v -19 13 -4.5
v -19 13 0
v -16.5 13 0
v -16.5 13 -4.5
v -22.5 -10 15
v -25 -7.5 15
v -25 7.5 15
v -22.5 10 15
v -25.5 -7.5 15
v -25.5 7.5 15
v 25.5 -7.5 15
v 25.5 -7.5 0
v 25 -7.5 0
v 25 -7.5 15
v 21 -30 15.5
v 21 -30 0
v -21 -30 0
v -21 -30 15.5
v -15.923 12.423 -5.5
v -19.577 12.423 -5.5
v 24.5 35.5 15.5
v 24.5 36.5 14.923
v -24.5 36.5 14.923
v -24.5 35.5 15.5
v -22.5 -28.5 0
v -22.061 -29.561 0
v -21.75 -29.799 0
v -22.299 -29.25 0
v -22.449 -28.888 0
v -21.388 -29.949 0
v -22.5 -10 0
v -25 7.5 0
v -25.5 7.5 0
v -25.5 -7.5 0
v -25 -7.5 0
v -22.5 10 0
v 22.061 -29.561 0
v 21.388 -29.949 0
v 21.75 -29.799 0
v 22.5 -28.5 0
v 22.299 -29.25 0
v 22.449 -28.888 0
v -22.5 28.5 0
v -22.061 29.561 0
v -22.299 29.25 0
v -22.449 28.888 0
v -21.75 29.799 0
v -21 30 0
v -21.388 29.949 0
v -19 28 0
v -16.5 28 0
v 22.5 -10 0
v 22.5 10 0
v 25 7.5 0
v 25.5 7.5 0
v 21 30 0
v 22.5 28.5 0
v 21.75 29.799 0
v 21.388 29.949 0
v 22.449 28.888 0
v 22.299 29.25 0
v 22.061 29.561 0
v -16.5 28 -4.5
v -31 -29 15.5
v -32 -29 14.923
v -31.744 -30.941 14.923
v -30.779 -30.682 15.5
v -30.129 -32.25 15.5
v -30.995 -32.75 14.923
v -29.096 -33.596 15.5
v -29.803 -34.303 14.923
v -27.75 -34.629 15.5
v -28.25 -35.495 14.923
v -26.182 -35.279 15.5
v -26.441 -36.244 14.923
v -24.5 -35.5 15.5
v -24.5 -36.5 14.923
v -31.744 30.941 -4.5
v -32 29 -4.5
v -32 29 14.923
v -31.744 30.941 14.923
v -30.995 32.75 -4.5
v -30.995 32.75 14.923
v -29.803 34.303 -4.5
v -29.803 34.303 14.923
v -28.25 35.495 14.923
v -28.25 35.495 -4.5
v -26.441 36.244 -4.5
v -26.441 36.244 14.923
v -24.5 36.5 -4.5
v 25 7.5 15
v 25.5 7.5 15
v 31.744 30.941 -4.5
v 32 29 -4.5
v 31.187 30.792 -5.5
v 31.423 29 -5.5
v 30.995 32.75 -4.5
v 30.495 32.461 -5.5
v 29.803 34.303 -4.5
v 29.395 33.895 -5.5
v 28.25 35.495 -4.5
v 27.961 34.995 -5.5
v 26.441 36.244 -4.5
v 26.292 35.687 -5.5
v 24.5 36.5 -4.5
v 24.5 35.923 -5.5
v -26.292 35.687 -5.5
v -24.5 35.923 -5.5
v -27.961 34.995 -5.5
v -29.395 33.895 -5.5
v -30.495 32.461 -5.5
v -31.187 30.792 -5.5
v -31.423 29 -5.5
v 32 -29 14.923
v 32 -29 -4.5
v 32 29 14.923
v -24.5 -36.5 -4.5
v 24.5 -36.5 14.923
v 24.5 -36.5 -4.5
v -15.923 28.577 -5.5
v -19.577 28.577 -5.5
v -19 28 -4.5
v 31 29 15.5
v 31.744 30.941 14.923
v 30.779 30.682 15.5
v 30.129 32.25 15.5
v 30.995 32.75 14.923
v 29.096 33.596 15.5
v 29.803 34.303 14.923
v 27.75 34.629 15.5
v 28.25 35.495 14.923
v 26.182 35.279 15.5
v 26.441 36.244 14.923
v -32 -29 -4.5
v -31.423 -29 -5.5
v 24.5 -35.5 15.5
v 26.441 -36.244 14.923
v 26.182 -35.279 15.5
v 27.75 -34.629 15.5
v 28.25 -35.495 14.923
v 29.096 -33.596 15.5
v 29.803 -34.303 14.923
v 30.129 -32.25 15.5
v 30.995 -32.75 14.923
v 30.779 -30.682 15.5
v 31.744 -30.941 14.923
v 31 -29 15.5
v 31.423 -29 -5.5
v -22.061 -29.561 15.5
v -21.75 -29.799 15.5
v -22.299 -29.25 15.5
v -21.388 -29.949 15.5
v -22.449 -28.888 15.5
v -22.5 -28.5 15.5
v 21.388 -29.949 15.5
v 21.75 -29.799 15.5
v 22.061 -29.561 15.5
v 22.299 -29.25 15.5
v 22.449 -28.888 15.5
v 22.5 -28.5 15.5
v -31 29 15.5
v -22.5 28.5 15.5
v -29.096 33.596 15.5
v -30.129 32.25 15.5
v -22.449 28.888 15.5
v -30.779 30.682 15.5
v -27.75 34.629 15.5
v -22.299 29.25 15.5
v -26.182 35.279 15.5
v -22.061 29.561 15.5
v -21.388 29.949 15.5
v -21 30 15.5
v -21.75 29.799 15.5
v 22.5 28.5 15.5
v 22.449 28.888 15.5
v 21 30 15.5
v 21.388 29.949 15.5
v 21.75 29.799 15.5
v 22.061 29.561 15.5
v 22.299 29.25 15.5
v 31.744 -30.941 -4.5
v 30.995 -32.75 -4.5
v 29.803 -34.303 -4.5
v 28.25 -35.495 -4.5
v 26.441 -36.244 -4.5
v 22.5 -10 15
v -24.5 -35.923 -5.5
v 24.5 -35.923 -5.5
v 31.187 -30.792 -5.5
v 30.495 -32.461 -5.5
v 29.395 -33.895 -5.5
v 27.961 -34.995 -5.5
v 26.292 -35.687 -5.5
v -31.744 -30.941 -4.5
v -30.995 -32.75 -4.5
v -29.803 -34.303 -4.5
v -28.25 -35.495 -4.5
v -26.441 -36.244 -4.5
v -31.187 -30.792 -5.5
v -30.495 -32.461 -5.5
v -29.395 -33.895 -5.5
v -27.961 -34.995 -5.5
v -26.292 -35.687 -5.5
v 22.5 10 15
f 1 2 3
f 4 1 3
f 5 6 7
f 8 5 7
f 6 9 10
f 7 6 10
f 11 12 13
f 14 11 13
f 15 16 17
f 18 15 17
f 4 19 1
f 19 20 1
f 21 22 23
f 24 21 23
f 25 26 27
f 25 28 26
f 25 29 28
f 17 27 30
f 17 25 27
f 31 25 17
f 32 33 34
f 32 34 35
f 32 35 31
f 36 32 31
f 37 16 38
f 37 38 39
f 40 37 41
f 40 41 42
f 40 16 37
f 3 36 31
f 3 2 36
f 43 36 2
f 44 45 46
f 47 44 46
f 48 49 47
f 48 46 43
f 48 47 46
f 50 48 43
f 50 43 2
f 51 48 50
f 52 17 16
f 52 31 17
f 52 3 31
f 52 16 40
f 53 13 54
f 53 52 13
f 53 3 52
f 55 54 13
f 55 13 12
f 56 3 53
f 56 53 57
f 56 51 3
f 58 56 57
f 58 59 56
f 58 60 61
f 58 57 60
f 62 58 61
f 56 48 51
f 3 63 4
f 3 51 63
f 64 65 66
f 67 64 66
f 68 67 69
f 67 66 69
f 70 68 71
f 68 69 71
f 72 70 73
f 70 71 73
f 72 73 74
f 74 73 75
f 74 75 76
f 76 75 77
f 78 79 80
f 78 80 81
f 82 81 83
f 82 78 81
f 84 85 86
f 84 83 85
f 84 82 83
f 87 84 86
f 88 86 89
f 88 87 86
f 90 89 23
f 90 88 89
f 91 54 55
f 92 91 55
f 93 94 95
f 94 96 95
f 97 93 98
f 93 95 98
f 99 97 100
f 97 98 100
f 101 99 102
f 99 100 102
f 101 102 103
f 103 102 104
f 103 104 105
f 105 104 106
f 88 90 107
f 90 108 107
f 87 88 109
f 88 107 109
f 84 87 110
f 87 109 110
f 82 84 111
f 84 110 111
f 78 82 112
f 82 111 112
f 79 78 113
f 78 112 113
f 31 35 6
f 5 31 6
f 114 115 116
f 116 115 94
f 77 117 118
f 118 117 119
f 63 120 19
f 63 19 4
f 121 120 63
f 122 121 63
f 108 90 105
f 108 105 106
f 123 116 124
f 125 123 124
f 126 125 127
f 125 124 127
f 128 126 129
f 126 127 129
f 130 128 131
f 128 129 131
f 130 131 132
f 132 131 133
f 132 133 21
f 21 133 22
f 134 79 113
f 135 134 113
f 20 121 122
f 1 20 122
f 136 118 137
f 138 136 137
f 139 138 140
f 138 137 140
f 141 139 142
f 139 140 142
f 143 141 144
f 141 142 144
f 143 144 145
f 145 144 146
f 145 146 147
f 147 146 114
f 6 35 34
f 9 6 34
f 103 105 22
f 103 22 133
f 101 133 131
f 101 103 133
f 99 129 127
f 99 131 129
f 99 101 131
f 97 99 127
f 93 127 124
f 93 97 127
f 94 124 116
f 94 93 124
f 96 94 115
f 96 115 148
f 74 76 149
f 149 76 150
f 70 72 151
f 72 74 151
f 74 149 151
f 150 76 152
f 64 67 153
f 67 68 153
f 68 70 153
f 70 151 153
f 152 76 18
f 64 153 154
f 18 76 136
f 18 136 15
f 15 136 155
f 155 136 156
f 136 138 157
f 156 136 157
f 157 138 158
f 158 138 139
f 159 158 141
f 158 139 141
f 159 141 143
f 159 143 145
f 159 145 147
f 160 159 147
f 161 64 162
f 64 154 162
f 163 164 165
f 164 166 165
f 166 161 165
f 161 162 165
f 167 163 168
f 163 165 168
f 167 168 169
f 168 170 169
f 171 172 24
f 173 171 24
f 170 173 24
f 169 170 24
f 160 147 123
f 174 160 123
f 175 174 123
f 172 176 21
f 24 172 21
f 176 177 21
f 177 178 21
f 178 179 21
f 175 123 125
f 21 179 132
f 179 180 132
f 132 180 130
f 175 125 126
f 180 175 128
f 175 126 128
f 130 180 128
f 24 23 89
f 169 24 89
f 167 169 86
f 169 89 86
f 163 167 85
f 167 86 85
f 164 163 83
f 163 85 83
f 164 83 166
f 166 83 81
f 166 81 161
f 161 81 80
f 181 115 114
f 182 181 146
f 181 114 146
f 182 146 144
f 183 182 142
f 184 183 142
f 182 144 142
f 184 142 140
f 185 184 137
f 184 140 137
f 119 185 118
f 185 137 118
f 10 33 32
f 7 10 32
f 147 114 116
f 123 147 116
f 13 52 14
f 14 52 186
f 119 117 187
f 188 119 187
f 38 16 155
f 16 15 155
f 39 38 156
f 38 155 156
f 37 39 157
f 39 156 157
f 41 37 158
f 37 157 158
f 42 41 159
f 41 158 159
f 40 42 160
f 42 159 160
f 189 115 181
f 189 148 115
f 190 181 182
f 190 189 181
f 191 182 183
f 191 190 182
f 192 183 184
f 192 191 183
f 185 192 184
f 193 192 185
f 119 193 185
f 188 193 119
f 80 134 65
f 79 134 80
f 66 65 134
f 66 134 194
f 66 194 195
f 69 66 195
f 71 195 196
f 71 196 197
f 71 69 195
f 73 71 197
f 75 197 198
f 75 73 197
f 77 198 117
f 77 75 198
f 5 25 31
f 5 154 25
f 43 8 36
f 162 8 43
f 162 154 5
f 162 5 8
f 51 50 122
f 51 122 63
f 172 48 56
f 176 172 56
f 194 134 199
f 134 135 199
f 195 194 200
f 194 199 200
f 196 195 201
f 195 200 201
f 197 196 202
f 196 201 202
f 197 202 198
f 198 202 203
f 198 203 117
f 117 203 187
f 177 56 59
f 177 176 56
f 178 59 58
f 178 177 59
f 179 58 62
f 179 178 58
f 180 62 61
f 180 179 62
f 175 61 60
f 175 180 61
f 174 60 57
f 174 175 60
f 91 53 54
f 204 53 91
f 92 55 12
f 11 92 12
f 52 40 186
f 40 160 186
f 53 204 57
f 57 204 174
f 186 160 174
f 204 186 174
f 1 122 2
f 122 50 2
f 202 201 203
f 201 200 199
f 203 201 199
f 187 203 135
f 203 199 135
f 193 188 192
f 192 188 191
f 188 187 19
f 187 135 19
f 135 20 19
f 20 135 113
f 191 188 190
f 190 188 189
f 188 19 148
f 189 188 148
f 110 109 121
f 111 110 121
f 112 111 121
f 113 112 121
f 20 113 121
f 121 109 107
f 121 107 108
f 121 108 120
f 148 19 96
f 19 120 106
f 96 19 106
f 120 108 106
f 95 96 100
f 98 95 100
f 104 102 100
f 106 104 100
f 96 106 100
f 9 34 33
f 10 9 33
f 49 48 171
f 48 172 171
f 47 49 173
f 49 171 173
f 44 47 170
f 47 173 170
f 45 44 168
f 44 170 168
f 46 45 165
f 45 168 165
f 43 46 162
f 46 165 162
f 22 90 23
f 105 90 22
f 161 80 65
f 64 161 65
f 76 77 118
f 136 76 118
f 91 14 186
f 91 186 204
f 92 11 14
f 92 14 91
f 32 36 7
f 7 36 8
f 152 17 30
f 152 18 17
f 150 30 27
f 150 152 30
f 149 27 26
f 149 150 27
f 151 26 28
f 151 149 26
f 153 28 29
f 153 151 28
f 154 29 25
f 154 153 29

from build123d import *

# Parameters (mm, degrees)
F0_W          = 64
F0_H          = 73
F1_DEPTH      = 5.5
F2_DEPTH      = 15.5
F3_W          = 15
F3_H          = 0.5
F4_DEPTH      = 3
F6_W          = 2.5
F6_H          = 15
F7_DEPTH      = 5.501
F8_SIZE       = 2.5
F9_R          = 1.5
F10_R         = 7.5
F11_T1_DEPTH  = 58
F11_T3_DEPTH  = 49
F11_T5_DEPTH  = 2.5
F11_T7_DEPTH  = 15
F11_T10_ANGLE = 90
F11_T12_ANGLE = 90
F11_T14_ANGLE = 90
F11_T16_ANGLE = 90
F11_T21_DEPTH = 5.0870857546
F11_T25_DEPTH = 17.5870857546
F11_T32_DEPTH = 5.0870857546
F11_T36_DEPTH = 17.5870857546
F11_T43_DEPTH = 17.5870857546
F11_T47_DEPTH = 5.0870857546
F11_T54_DEPTH = 5.0870857546
F11_T58_DEPTH = 17.5870857546
F12_SIZE2     = 0.5773502692
F12_SIZE      = 1


# Not quite as in the source:
# - a fillet or chamfer that OpenCascade refuses, or shapes differently, is made with other operations: its cross-section is extruded or revolved along the edge and cut away or added


with BuildPart() as f1:
    # F0 (on Top) → F1 (new body)
    with BuildSketch(Plane.XY):
        Rectangle(F0_W, F0_H)
        Polygon((-22.5, 7.5), (-22.5, 30), (22.5, 30), (22.5, 7.5), (25.5, 7.5), (25.5, -7.5), (22.5, -7.5), (22.5, -30), (-22.5, -30), (-22.5, -7.5), (-25.5, -7.5), (-25.5, 7.5), align=None, mode=Mode.SUBTRACT)
        Polygon((22.5, 30), (-22.5, 30), (-22.5, 7.5), (-25.5, 7.5), (-25.5, -7.5), (-22.5, -7.5), (-22.5, -30), (22.5, -30), (22.5, -7.5), (25.5, -7.5), (25.5, 7.5), (22.5, 7.5), align=None)
    extrude(amount=-F1_DEPTH)

    # F0 (on Top) → F2 (join)
    with BuildSketch(Plane.XY):
        Rectangle(F0_W, F0_H)
        Polygon((-22.5, 7.5), (-22.5, 30), (22.5, 30), (22.5, 7.5), (25.5, 7.5), (25.5, -7.5), (22.5, -7.5), (22.5, -30), (-22.5, -30), (-22.5, -7.5), (-25.5, -7.5), (-25.5, 7.5), align=None, mode=Mode.SUBTRACT)
    extrude(amount=F2_DEPTH)

    # F3 (on face) → F4 (join, through all)
    with BuildSketch(Plane.YZ.offset(-25.5)):
        with Locations((0, 15.25)):
            Rectangle(F3_W, F3_H)
    extrude(amount=F4_DEPTH)

    # F5: F1 across plane


with BuildPart() as f1_1:
    add(f1.part)
    add(f1.part.mirror(Plane.YZ))

    # F6 (on face) → F7 (cut, through all)
    with BuildSketch(Plane.XY):
        with Locations((-17.75, 20.5)):
            Rectangle(F6_W, F6_H)
    extrude(amount=-F7_DEPTH, mode=Mode.SUBTRACT)

    # F8
    f8_edges = [f1_1.edges().sort_by_distance(p)[0] for p in [
        (-22.5, -7.5, 7.5),
        (-22.5, 7.5, 7.5),
        (22.5, 7.5, 7.5),
        (22.5, -7.5, 7.5),
    ]]
    chamfer(f8_edges, length=F8_SIZE)

    # F9
    f9_edges = [f1_1.edges().sort_by_distance(p)[0] for p in [
        (-22.5, 30, 7.75),
        (-22.5, -30, 7.75),
        (22.5, 30, 7.75),
        (22.5, -30, 7.75),
    ]]
    fillet(f9_edges, radius=F9_R)

    # F10
    f10_edges = [f1_1.edges().sort_by_distance(p)[0] for p in [
        (-32, -36.5, 5),
        (32, -36.5, 5),
        (-32, 36.5, 5),
        (32, 36.5, 5),
    ]]
    fillet(f10_edges, radius=F10_R)

    # F11: chamfer of 1 x 0.5773502692 on 12 edges, made by hand

    # F11_s2 → F11_t1 (cut)
    with BuildSketch(Plane.XZ.offset(-29)):
        Polygon((32, -4.5), (31.4226497308, -5.5), (32, -5.5), align=None)
        Polygon((-32, -4.5), (-31.4226497308, -5.5), (-32, -5.5), align=None)
    extrude(amount=F11_T1_DEPTH, mode=Mode.SUBTRACT)

    # F11_s4 → F11_t3 (cut)
    with BuildSketch(Plane.YZ.offset(-24.5)):
        Polygon((-36.5, -4.5), (-35.9226497308, -5.5), (-36.5, -5.5), align=None)
        Polygon((36.5, -4.5), (35.9226497308, -5.5), (36.5, -5.5), align=None)
    extrude(amount=F11_T3_DEPTH, mode=Mode.SUBTRACT)

    # F11_s6 → F11_t5 (cut)
    with BuildSketch(Plane.YZ.offset(-19)):
        Polygon((28.5773502692, -5.5), (28, -4.5), (28, -5.5), align=None)
        Polygon((12.4226497308, -5.5), (13, -4.5), (13, -5.5), align=None)
    extrude(amount=F11_T5_DEPTH, mode=Mode.SUBTRACT)

    # F11_s8 → F11_t7 (cut)
    with BuildSketch(Plane.XZ.offset(-28)):
        Polygon((-19.5773502692, -5.5), (-19, -4.5), (-19, -5.5), align=None)
        Polygon((-15.9226497308, -5.5), (-16.5, -4.5), (-16.5, -5.5), align=None)
    extrude(amount=F11_T7_DEPTH, mode=Mode.SUBTRACT)

    # F11_s9 → F11_t10 (revolve, cut)
    with BuildSketch(Plane.XZ.offset(29)):
        Polygon((32, -4.5), (31.4226497308, -5.5), (32, -5.5), align=None)
    revolve(axis=Axis((24.5, -29, -5.5), (0, 0, -1)), revolution_arc=F11_T10_ANGLE, mode=Mode.SUBTRACT)

    # F11_s11 → F11_t12 (revolve, cut)
    with BuildSketch(Plane.XZ.offset(-29)):
        Polygon((32, -4.5), (31.4226497308, -5.5), (32, -5.5), align=None)
    revolve(axis=Axis((24.5, 29, -5.5), (0, 0, 1)), revolution_arc=F11_T12_ANGLE, mode=Mode.SUBTRACT)

    # F11_s13 → F11_t14 (revolve, cut)
    with BuildSketch(Plane.XZ.offset(29)):
        Polygon((-32, -4.5), (-31.4226497308, -5.5), (-32, -5.5), align=None)
    revolve(axis=Axis((-24.5, -29, -5.5), (0, 0, 1)), revolution_arc=F11_T14_ANGLE, mode=Mode.SUBTRACT)

    # F11_s15 → F11_t16 (revolve, cut)
    with BuildSketch(Plane.YZ.offset(-24.5)):
        Polygon((36.5, -4.5), (35.9226497308, -5.5), (36.5, -5.5), align=None)
    revolve(axis=Axis((-24.5, 29, -5.5), (0, 0, 1)), revolution_arc=F11_T16_ANGLE, mode=Mode.SUBTRACT)


with BuildPart() as f11_tool19:
    # F11_s20 → F11_t21 (new body)
    with BuildSketch(Plane.YZ.offset(-13.9129142454)):
        Polygon((28.5773502692, -5.5), (28, -4.5), (28, -5.5), align=None)
    extrude(amount=-F11_T21_DEPTH)

    split(bisect_by=Plane.YZ.offset(-16.5), keep=Keep.TOP)


with BuildPart() as f11_tool23:
    # F11_s24 → F11_t25 (new body)
    with BuildSketch(Plane.XZ.offset(-13)):
        Polygon((-15.9226497308, -5.5), (-16.5, -4.5), (-16.5, -5.5), align=None)
    extrude(amount=-F11_T25_DEPTH)

    split(bisect_by=Plane.XZ.offset(-28), keep=Keep.BOTTOM)


with BuildPart() as f11_tool19_1:
    add(f11_tool19.part)

    # F11_t27: intersect F11_tool23
    add(f11_tool23.part, mode=Mode.INTERSECT)


with BuildPart() as f1_2:
    add(f1_1.part)

    # F11_t17: cut F11_tool19
    add(f11_tool19_1.part, mode=Mode.SUBTRACT)


with BuildPart() as f11_tool30:
    # F11_s31 → F11_t32 (new body)
    with BuildSketch(Plane.YZ.offset(-16.5)):
        Polygon((28.5773502692, -5.5), (28, -4.5), (28, -5.5), align=None)
    extrude(amount=-F11_T32_DEPTH)

    split(bisect_by=Plane.YZ.offset(-19), keep=Keep.BOTTOM)


with BuildPart() as f11_tool34:
    # F11_s35 → F11_t36 (new body)
    with BuildSketch(Plane.XZ.offset(-30.5870857546)):
        Polygon((-19.5773502692, -5.5), (-19, -4.5), (-19, -5.5), align=None)
    extrude(amount=F11_T36_DEPTH)

    split(bisect_by=Plane.XZ.offset(-28), keep=Keep.BOTTOM)


with BuildPart() as f11_tool30_1:
    add(f11_tool30.part)

    # F11_t38: intersect F11_tool34
    add(f11_tool34.part, mode=Mode.INTERSECT)


with BuildPart() as f1_3:
    add(f1_2.part)

    # F11_t28: cut F11_tool30
    add(f11_tool30_1.part, mode=Mode.SUBTRACT)


with BuildPart() as f11_tool41:
    # F11_s42 → F11_t43 (new body)
    with BuildSketch(Plane.XZ.offset(-28)):
        Polygon((-19.5773502692, -5.5), (-19, -4.5), (-19, -5.5), align=None)
    extrude(amount=F11_T43_DEPTH)

    split(bisect_by=Plane.XZ.offset(-13), keep=Keep.TOP)


with BuildPart() as f11_tool45:
    # F11_s46 → F11_t47 (new body)
    with BuildSketch(Plane.YZ.offset(-21.5870857546)):
        Polygon((12.4226497308, -5.5), (13, -4.5), (13, -5.5), align=None)
    extrude(amount=F11_T47_DEPTH)

    split(bisect_by=Plane.YZ.offset(-19), keep=Keep.BOTTOM)


with BuildPart() as f11_tool41_1:
    add(f11_tool41.part)

    # F11_t49: intersect F11_tool45
    add(f11_tool45.part, mode=Mode.INTERSECT)


with BuildPart() as f1_4:
    add(f1_3.part)

    # F11_t39: cut F11_tool41
    add(f11_tool41_1.part, mode=Mode.SUBTRACT)


with BuildPart() as f11_tool52:
    # F11_s53 → F11_t54 (new body)
    with BuildSketch(Plane.YZ.offset(-19)):
        Polygon((12.4226497308, -5.5), (13, -4.5), (13, -5.5), align=None)
    extrude(amount=F11_T54_DEPTH)

    split(bisect_by=Plane.YZ.offset(-16.5), keep=Keep.TOP)


with BuildPart() as f11_tool56:
    # F11_s57 → F11_t58 (new body)
    with BuildSketch(Plane.XZ.offset(-10.4129142454)):
        Polygon((-15.9226497308, -5.5), (-16.5, -4.5), (-16.5, -5.5), align=None)
    extrude(amount=-F11_T58_DEPTH)

    split(bisect_by=Plane.XZ.offset(-13), keep=Keep.TOP)


with BuildPart() as f11_tool52_1:
    add(f11_tool52.part)

    # F11_t60: intersect F11_tool56
    add(f11_tool56.part, mode=Mode.INTERSECT)


with BuildPart() as f1_5:
    add(f1_4.part)

    # F11_t50: cut F11_tool52
    add(f11_tool52_1.part, mode=Mode.SUBTRACT)

    # F12
    f12_edges = [f1_5.edges().sort_by_distance(p)[0] for p in [
        (-29.803301, -34.303301, 15.5),
        (-32, 0, 15.5),
        (0, -36.5, 15.5),
        (29.803301, -34.303301, 15.5),
        (32, 0, 15.5),
        (29.803301, 34.303301, 15.5),
        (0, 36.5, 15.5),
        (-29.803301, 34.303301, 15.5),
    ]]
    chamfer(f12_edges, length=F12_SIZE, length2=F12_SIZE2)


solid = f1_5.part
